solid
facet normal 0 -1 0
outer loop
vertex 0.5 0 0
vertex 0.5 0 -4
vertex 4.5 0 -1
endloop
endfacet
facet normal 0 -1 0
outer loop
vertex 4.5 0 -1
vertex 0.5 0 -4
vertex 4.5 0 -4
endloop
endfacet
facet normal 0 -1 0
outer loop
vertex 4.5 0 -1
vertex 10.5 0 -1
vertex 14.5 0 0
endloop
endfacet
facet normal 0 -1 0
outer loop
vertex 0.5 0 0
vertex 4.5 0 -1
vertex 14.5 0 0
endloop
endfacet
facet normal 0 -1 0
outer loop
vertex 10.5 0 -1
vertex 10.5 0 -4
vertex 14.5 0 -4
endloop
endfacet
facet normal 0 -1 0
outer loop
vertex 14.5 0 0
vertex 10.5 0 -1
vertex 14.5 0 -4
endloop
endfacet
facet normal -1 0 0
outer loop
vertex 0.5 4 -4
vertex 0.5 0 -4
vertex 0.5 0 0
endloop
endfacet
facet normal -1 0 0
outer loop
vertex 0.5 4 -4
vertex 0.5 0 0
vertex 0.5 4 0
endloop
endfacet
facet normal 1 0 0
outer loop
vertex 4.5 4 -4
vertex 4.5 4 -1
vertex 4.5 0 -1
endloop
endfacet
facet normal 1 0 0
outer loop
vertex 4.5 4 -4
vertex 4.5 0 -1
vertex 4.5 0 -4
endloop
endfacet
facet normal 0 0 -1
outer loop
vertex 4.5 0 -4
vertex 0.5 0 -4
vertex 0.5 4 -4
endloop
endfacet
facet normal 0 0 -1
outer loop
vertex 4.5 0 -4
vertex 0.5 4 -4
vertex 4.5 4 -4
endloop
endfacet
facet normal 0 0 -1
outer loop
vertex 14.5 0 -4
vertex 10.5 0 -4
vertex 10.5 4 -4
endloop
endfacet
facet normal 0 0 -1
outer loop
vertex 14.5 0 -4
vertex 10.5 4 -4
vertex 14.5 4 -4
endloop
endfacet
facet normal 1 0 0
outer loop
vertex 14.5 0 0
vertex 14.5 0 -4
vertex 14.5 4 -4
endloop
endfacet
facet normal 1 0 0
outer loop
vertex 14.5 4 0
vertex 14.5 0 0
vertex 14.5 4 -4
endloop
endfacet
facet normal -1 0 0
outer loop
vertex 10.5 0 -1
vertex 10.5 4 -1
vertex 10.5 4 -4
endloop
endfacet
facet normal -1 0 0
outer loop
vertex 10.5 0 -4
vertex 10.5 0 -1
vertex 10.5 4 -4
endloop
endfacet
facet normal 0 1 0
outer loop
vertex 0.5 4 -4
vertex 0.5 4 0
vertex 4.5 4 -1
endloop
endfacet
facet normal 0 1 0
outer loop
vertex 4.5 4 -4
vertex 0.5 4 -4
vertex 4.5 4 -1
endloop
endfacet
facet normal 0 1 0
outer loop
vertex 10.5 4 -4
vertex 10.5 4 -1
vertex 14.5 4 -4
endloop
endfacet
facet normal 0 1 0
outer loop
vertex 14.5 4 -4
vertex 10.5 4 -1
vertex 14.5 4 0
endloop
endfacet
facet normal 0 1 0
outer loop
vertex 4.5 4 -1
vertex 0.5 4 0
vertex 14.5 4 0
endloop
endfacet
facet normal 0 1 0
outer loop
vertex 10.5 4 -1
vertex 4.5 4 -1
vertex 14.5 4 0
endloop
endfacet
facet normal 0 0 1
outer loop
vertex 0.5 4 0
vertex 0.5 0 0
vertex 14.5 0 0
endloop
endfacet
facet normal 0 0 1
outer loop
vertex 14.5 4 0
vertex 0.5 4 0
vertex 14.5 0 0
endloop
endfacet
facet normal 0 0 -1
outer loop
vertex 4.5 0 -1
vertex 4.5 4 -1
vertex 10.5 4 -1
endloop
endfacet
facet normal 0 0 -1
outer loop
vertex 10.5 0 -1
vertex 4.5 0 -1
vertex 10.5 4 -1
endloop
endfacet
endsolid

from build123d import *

# Parameters (mm, degrees)
SKETCH1_W           = 15
SKETCH1_H           = 4
BOSS_EXTRUDE1_DEPTH = 4.5
SKETCH2_W           = 6
SKETCH2_H           = 3
CUT_EXTRUDE1_DEPTH  = 4.5
SKETCH3_W           = 0.5
SKETCH3_H           = 4.5
CUT_EXTRUDE2_DEPTH  = 9.5
SKETCH4_W           = 0.5
SKETCH4_H           = 4.5
CUT_EXTRUDE3_DEPTH  = 9.5
SKETCH6_W           = 14
SKETCH6_H           = 0.5
CUT_EXTRUDE5_DEPTH  = 9.5


with BuildPart() as part:
    # Sketch1 → Boss-Extrude1 (new body)
    with BuildSketch(Plane(origin=(0, 0, 0), x_dir=(1, 0, 0), z_dir=(0, 1, 0))):
        with Locations((7.5, 2)):
            Rectangle(SKETCH1_W, SKETCH1_H)
    extrude(amount=BOSS_EXTRUDE1_DEPTH)

    # Sketch2 → Cut-Extrude1 (cut)
    with BuildSketch(Plane(origin=(0, 4.5, 0), x_dir=(1, 0, 0), z_dir=(0, 1, 0))):
        with Locations((7.5, 2.5)):
            Rectangle(SKETCH2_W, SKETCH2_H)
    extrude(amount=-CUT_EXTRUDE1_DEPTH, mode=Mode.SUBTRACT)

    # Sketch3 → Cut-Extrude2 (cut)
    with BuildSketch(Plane(origin=(0, 0, -4), x_dir=(-1, 0, 0), z_dir=(0, 0, -1))):
        with Locations((-0.25, 2.25)):
            Rectangle(SKETCH3_W, SKETCH3_H)
    extrude(amount=-CUT_EXTRUDE2_DEPTH, mode=Mode.SUBTRACT)

    # Sketch4 → Cut-Extrude3 (cut)
    with BuildSketch(Plane(origin=(0, 0, -4), x_dir=(-1, 0, 0), z_dir=(0, 0, -1))):
        with Locations((-14.75, 2.25)):
            Rectangle(SKETCH4_W, SKETCH4_H)
    extrude(amount=-CUT_EXTRUDE3_DEPTH, mode=Mode.SUBTRACT)

    # Sketch6 → Cut-Extrude5 (cut)
    with BuildSketch(Plane.XY):
        with Locations((7.5, 4.25)):
            Rectangle(SKETCH6_W, SKETCH6_H)
    extrude(amount=-CUT_EXTRUDE5_DEPTH, mode=Mode.SUBTRACT)


solid = part.part
